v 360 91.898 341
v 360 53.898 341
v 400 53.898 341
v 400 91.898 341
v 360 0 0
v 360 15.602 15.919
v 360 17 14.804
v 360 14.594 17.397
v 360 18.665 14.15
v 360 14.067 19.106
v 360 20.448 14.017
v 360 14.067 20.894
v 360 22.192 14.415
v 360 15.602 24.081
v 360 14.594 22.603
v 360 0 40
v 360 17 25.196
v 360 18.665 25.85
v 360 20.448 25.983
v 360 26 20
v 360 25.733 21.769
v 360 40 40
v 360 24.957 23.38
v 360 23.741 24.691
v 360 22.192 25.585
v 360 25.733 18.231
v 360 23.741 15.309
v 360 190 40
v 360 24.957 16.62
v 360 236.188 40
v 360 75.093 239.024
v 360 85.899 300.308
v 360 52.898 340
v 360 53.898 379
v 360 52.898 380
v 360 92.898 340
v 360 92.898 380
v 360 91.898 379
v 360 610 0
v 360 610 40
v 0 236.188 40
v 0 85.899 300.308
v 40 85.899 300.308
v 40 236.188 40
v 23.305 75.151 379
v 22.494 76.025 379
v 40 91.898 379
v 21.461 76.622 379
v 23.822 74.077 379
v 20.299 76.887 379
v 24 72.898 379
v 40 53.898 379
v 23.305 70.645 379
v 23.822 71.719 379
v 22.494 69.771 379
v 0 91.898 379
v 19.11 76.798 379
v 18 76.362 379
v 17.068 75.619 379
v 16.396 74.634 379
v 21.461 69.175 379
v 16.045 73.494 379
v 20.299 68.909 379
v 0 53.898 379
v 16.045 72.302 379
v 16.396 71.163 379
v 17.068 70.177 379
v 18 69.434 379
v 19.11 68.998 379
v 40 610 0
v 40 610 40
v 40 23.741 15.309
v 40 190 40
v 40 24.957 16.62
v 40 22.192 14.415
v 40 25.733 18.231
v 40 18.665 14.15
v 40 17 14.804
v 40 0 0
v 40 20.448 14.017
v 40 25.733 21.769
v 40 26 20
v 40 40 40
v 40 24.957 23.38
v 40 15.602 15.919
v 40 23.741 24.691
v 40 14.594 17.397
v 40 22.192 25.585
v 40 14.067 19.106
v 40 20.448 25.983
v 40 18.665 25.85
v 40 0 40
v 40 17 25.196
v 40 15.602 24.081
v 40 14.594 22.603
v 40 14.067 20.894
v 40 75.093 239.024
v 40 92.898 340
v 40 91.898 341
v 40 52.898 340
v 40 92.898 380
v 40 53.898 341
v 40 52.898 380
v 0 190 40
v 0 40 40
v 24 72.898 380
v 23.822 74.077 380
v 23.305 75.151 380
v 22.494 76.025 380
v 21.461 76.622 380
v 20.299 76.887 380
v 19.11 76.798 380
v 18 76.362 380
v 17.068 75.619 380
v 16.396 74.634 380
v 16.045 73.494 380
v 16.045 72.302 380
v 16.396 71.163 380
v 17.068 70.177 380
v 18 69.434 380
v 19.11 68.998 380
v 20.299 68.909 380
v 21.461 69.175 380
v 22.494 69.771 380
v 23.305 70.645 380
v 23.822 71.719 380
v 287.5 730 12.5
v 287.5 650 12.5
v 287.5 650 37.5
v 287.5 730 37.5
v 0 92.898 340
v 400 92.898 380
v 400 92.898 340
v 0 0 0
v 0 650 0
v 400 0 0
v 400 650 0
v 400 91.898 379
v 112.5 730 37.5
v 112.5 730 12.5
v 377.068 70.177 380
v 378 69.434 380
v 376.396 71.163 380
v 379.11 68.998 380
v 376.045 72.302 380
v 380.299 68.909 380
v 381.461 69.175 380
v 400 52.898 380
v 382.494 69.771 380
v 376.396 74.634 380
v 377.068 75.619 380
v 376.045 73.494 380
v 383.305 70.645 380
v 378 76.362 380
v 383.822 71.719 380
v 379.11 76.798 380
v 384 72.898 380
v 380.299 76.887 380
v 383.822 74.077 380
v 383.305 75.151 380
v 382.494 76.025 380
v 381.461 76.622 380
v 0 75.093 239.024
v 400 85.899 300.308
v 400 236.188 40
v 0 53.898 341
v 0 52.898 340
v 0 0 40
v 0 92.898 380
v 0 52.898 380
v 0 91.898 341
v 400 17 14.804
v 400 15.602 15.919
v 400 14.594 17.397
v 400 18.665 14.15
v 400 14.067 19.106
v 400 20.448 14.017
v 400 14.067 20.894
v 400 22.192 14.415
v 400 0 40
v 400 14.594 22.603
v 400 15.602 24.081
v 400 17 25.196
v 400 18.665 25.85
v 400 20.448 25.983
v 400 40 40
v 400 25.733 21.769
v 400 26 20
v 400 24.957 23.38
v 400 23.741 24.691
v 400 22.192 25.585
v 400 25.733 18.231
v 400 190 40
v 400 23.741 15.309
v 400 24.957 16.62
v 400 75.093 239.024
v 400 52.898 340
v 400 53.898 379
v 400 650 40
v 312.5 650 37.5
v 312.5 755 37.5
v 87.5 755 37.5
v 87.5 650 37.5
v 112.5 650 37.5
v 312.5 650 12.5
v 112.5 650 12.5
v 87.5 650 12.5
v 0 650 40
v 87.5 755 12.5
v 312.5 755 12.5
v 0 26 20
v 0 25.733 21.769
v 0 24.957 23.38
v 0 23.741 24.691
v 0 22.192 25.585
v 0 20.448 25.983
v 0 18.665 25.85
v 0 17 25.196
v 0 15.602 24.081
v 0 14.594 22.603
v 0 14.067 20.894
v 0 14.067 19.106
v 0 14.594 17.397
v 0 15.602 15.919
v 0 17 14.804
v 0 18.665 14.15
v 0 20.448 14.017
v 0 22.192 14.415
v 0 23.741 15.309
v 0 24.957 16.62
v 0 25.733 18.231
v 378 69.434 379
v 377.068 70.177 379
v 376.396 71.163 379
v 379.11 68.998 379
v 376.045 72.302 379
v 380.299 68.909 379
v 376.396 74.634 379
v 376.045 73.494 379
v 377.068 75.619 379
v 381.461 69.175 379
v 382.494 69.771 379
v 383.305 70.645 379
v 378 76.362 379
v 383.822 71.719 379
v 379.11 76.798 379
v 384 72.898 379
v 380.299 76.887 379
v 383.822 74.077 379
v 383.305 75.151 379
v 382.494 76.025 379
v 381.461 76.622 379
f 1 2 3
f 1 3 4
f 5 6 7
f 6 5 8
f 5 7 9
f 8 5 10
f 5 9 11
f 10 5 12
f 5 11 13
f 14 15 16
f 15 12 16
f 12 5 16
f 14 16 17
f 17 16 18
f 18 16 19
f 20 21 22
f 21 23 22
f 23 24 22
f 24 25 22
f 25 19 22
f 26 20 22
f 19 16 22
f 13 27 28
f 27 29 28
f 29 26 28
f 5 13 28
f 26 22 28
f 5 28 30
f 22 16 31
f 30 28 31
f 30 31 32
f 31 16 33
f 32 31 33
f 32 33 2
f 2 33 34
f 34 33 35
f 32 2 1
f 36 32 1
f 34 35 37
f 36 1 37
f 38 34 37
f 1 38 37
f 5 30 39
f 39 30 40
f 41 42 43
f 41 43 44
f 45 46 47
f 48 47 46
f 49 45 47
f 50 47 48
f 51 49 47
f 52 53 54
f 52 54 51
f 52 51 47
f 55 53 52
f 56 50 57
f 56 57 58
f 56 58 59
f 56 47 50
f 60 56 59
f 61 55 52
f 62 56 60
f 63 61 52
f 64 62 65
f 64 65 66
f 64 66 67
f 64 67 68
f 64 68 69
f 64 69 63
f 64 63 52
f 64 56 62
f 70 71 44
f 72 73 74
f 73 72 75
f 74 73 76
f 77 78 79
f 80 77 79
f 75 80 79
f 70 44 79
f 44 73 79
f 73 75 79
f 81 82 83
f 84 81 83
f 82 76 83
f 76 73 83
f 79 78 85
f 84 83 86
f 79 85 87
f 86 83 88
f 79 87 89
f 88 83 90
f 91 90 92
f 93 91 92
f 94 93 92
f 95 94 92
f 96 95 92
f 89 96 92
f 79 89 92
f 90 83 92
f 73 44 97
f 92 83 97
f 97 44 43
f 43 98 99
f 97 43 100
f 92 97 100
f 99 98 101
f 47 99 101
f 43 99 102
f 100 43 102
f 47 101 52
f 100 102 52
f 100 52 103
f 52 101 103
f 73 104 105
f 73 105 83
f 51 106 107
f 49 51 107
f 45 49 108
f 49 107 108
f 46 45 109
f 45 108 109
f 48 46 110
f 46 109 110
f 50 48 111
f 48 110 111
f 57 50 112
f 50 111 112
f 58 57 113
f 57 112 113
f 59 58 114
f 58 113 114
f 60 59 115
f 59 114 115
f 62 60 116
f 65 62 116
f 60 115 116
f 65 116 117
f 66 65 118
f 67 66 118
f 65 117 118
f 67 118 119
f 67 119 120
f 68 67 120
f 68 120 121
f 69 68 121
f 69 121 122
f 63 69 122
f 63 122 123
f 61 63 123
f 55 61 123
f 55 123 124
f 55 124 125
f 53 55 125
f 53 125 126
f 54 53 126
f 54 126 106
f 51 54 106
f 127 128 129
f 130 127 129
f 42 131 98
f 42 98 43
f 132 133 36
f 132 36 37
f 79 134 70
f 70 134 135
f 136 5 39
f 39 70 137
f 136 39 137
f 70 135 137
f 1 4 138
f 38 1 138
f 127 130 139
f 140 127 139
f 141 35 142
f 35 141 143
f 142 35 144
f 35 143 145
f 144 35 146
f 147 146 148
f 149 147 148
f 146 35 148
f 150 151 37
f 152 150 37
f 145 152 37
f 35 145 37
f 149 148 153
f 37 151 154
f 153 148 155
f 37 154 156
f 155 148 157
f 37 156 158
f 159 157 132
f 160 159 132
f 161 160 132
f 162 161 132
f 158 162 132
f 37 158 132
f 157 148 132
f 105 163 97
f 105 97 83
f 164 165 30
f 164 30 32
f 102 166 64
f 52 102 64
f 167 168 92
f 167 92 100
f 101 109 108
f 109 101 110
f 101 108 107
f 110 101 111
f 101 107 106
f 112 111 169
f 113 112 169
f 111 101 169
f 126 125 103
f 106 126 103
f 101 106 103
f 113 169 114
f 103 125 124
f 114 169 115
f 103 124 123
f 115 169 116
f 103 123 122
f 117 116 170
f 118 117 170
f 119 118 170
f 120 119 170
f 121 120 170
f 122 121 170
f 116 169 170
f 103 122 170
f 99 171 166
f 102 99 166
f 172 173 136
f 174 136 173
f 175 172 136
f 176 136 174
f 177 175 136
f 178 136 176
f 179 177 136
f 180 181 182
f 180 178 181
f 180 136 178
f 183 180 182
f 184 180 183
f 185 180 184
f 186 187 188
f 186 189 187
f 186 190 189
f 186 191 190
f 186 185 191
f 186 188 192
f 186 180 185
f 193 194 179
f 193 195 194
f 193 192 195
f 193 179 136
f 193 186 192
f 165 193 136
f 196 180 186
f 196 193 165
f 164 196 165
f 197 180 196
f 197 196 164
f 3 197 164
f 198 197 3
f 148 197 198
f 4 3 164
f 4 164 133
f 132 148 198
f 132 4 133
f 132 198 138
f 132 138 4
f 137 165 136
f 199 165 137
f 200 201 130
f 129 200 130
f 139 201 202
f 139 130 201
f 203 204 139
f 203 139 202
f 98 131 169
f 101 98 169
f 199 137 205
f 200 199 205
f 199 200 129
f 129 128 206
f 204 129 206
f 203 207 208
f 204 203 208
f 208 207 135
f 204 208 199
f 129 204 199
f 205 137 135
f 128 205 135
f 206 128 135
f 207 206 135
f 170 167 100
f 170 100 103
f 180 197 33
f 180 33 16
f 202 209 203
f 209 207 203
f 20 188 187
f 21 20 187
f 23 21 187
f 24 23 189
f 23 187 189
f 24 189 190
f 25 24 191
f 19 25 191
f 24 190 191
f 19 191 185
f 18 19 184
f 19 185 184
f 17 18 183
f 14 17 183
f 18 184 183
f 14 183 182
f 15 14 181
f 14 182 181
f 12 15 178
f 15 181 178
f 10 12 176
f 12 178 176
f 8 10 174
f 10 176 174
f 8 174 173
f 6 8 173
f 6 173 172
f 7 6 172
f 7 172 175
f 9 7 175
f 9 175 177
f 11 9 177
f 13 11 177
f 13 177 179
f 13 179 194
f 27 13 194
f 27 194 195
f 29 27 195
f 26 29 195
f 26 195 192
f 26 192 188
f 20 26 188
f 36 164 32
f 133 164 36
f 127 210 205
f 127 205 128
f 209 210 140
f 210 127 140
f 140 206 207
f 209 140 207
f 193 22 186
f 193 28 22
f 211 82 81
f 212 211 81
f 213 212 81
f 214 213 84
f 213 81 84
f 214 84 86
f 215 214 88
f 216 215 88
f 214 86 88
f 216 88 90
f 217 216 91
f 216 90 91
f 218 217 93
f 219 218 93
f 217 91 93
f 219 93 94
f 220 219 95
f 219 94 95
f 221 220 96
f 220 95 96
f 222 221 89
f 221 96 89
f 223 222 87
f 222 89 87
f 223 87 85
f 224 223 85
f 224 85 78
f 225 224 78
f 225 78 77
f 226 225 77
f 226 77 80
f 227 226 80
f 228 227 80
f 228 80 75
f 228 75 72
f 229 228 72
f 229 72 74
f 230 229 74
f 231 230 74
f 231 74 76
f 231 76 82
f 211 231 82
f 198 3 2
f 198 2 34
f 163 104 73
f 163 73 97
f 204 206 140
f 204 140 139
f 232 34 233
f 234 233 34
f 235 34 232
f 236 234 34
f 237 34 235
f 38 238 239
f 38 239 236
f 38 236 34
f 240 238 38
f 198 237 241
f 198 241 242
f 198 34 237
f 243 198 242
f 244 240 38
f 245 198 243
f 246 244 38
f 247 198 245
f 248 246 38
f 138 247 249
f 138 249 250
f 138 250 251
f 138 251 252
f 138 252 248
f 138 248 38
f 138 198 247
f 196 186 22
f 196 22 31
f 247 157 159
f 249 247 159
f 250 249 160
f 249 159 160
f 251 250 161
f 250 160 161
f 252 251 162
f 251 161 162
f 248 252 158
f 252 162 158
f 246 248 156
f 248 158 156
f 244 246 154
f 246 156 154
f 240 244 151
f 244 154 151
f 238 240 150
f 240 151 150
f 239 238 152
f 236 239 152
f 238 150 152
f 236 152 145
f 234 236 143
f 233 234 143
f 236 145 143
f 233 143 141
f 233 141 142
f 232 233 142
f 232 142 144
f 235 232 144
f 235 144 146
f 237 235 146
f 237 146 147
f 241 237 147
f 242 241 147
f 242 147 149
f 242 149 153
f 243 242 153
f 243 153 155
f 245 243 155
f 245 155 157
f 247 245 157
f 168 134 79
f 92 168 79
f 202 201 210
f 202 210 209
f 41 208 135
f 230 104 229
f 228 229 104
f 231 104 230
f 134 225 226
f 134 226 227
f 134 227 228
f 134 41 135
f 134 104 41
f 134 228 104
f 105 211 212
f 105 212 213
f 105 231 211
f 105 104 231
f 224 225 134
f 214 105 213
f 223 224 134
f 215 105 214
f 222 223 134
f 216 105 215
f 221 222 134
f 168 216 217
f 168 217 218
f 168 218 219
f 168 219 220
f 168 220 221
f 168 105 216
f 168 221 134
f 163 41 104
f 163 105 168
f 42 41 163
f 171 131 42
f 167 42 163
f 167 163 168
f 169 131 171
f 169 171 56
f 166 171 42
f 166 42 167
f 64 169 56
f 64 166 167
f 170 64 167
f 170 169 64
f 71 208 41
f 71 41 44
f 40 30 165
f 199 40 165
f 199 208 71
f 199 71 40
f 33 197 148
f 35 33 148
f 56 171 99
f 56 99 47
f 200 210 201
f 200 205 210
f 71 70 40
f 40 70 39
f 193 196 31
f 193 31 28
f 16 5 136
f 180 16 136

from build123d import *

# Parameters (mm, degrees)
F1_DEPTH  = 40
F2_W      = 25
F2_H      = 25
F3_DEPTH  = 80
F4_W      = 225
F4_H      = 25
F5_DEPTH  = 25
F7_DEPTH  = 40
F9_DEPTH  = 40
F10_R     = 6
F11_DEPTH = 400.001
F12_W     = 40
F12_H     = 40
F12_W_2   = 38
F12_H_2   = 38
F13_DEPTH = 40
F14_W     = 40
F14_H     = 40
F14_W_2   = 38
F14_H_2   = 38
F15_DEPTH = 40
F16_R     = 4
F17_DEPTH = 25
F18_R     = 4
F19_DEPTH = 25
F21_DEPTH = 40
F23_DEPTH = 40


with BuildPart() as f1:
    # F0 (on Top) → F1 (new body)
    with BuildSketch(Plane.XY):
        Polygon((0, 650), (0, 0), (40, 0), (40, 610), (360, 610), (360, 0), (400, 0), (400, 650), align=None)
    extrude(amount=F1_DEPTH)

    # F2 (on face) → F3 (join)
    with BuildSketch(Plane(origin=(0, 650, 0), x_dir=(-1, 0, 0), z_dir=(0, 1, 0))):
        with Locations((-100, 25)):
            Rectangle(F2_W, F2_H)
        with Locations((-300, 25)):
            Rectangle(F2_W, F2_H)
    extrude(amount=F3_DEPTH)

    # F4 (on face) → F5 (join)
    with BuildSketch(Plane(origin=(0, 730, 0), x_dir=(-1, 0, 0), z_dir=(0, 1, 0))):
        with Locations((-200, 25)):
            Rectangle(F4_W, F4_H)
    extrude(amount=F5_DEPTH)

    # F6 (on face) → F7 (join)
    with BuildSketch(Plane(origin=(0, 0, 0), x_dir=(0, -1, 0), z_dir=(-1, 0, 0))):
        Polygon((-40, 40), (0, 40), (-52.8980942125, 340), (-92.8980942125, 340), align=None)
    extrude(amount=-F7_DEPTH)

    # F8 (on face) → F9 (join)
    with BuildSketch(Plane.YZ.offset(400)):
        Polygon((52.8980942125, 340), (0, 40), (40, 40), (92.8980942125, 340), align=None)
    extrude(amount=-F9_DEPTH)

    # F10 (on face) → F11 (cut, through all)
    with BuildSketch(Plane.YZ.offset(400)):
        with Locations((20, 20)):
            Circle(F10_R)
    extrude(amount=-F11_DEPTH, mode=Mode.SUBTRACT)

    # F12 (on face) → F13 (join)
    with BuildSketch(Plane.YZ.offset(400)):
        with Locations((72.8980942125, 360)):
            Rectangle(F12_W, F12_H)
        with Locations((72.8980942125, 360)):
            Rectangle(F12_W_2, F12_H_2, mode=Mode.SUBTRACT)
    extrude(amount=-F13_DEPTH)

    # F14 (on face) → F15 (join)
    with BuildSketch(Plane(origin=(0, 0, 0), x_dir=(0, -1, 0), z_dir=(-1, 0, 0))):
        with Locations((-72.8980942125, 360)):
            Rectangle(F14_W, F14_H)
        with Locations((-72.8980942125, 360)):
            Rectangle(F14_W_2, F14_H_2, mode=Mode.SUBTRACT)
    extrude(amount=-F15_DEPTH)

    # F16 (on face) → F17 (cut)
    with BuildSketch(Plane.XY.offset(380)):
        with Locations((20, 72.8980942125)):
            Circle(F16_R)
    extrude(amount=-F17_DEPTH, mode=Mode.SUBTRACT)

    # F18 (on face) → F19 (cut)
    with BuildSketch(Plane.XY.offset(380)):
        with Locations((380, 72.8980942125)):
            Circle(F18_R)
    extrude(amount=-F19_DEPTH, mode=Mode.SUBTRACT)

    # F20 (on face) → F21 (join)
    with BuildSketch(Plane.YZ.offset(400)):
        Polygon((75.0933335322, 239.0241844507), (190, 40), (236.1880215352, 40), (85.8992778316, 300.3077399002), align=None)
    extrude(amount=-F21_DEPTH)

    # F22 (on face) → F23 (join)
    with BuildSketch(Plane(origin=(0, 0, 0), x_dir=(0, -1, 0), z_dir=(-1, 0, 0))):
        Polygon((-236.1880215352, 40), (-190, 40), (-75.0933335322, 239.0241844507), (-85.8992778316, 300.3077399002), align=None)
    extrude(amount=-F23_DEPTH)


solid = f1.part
